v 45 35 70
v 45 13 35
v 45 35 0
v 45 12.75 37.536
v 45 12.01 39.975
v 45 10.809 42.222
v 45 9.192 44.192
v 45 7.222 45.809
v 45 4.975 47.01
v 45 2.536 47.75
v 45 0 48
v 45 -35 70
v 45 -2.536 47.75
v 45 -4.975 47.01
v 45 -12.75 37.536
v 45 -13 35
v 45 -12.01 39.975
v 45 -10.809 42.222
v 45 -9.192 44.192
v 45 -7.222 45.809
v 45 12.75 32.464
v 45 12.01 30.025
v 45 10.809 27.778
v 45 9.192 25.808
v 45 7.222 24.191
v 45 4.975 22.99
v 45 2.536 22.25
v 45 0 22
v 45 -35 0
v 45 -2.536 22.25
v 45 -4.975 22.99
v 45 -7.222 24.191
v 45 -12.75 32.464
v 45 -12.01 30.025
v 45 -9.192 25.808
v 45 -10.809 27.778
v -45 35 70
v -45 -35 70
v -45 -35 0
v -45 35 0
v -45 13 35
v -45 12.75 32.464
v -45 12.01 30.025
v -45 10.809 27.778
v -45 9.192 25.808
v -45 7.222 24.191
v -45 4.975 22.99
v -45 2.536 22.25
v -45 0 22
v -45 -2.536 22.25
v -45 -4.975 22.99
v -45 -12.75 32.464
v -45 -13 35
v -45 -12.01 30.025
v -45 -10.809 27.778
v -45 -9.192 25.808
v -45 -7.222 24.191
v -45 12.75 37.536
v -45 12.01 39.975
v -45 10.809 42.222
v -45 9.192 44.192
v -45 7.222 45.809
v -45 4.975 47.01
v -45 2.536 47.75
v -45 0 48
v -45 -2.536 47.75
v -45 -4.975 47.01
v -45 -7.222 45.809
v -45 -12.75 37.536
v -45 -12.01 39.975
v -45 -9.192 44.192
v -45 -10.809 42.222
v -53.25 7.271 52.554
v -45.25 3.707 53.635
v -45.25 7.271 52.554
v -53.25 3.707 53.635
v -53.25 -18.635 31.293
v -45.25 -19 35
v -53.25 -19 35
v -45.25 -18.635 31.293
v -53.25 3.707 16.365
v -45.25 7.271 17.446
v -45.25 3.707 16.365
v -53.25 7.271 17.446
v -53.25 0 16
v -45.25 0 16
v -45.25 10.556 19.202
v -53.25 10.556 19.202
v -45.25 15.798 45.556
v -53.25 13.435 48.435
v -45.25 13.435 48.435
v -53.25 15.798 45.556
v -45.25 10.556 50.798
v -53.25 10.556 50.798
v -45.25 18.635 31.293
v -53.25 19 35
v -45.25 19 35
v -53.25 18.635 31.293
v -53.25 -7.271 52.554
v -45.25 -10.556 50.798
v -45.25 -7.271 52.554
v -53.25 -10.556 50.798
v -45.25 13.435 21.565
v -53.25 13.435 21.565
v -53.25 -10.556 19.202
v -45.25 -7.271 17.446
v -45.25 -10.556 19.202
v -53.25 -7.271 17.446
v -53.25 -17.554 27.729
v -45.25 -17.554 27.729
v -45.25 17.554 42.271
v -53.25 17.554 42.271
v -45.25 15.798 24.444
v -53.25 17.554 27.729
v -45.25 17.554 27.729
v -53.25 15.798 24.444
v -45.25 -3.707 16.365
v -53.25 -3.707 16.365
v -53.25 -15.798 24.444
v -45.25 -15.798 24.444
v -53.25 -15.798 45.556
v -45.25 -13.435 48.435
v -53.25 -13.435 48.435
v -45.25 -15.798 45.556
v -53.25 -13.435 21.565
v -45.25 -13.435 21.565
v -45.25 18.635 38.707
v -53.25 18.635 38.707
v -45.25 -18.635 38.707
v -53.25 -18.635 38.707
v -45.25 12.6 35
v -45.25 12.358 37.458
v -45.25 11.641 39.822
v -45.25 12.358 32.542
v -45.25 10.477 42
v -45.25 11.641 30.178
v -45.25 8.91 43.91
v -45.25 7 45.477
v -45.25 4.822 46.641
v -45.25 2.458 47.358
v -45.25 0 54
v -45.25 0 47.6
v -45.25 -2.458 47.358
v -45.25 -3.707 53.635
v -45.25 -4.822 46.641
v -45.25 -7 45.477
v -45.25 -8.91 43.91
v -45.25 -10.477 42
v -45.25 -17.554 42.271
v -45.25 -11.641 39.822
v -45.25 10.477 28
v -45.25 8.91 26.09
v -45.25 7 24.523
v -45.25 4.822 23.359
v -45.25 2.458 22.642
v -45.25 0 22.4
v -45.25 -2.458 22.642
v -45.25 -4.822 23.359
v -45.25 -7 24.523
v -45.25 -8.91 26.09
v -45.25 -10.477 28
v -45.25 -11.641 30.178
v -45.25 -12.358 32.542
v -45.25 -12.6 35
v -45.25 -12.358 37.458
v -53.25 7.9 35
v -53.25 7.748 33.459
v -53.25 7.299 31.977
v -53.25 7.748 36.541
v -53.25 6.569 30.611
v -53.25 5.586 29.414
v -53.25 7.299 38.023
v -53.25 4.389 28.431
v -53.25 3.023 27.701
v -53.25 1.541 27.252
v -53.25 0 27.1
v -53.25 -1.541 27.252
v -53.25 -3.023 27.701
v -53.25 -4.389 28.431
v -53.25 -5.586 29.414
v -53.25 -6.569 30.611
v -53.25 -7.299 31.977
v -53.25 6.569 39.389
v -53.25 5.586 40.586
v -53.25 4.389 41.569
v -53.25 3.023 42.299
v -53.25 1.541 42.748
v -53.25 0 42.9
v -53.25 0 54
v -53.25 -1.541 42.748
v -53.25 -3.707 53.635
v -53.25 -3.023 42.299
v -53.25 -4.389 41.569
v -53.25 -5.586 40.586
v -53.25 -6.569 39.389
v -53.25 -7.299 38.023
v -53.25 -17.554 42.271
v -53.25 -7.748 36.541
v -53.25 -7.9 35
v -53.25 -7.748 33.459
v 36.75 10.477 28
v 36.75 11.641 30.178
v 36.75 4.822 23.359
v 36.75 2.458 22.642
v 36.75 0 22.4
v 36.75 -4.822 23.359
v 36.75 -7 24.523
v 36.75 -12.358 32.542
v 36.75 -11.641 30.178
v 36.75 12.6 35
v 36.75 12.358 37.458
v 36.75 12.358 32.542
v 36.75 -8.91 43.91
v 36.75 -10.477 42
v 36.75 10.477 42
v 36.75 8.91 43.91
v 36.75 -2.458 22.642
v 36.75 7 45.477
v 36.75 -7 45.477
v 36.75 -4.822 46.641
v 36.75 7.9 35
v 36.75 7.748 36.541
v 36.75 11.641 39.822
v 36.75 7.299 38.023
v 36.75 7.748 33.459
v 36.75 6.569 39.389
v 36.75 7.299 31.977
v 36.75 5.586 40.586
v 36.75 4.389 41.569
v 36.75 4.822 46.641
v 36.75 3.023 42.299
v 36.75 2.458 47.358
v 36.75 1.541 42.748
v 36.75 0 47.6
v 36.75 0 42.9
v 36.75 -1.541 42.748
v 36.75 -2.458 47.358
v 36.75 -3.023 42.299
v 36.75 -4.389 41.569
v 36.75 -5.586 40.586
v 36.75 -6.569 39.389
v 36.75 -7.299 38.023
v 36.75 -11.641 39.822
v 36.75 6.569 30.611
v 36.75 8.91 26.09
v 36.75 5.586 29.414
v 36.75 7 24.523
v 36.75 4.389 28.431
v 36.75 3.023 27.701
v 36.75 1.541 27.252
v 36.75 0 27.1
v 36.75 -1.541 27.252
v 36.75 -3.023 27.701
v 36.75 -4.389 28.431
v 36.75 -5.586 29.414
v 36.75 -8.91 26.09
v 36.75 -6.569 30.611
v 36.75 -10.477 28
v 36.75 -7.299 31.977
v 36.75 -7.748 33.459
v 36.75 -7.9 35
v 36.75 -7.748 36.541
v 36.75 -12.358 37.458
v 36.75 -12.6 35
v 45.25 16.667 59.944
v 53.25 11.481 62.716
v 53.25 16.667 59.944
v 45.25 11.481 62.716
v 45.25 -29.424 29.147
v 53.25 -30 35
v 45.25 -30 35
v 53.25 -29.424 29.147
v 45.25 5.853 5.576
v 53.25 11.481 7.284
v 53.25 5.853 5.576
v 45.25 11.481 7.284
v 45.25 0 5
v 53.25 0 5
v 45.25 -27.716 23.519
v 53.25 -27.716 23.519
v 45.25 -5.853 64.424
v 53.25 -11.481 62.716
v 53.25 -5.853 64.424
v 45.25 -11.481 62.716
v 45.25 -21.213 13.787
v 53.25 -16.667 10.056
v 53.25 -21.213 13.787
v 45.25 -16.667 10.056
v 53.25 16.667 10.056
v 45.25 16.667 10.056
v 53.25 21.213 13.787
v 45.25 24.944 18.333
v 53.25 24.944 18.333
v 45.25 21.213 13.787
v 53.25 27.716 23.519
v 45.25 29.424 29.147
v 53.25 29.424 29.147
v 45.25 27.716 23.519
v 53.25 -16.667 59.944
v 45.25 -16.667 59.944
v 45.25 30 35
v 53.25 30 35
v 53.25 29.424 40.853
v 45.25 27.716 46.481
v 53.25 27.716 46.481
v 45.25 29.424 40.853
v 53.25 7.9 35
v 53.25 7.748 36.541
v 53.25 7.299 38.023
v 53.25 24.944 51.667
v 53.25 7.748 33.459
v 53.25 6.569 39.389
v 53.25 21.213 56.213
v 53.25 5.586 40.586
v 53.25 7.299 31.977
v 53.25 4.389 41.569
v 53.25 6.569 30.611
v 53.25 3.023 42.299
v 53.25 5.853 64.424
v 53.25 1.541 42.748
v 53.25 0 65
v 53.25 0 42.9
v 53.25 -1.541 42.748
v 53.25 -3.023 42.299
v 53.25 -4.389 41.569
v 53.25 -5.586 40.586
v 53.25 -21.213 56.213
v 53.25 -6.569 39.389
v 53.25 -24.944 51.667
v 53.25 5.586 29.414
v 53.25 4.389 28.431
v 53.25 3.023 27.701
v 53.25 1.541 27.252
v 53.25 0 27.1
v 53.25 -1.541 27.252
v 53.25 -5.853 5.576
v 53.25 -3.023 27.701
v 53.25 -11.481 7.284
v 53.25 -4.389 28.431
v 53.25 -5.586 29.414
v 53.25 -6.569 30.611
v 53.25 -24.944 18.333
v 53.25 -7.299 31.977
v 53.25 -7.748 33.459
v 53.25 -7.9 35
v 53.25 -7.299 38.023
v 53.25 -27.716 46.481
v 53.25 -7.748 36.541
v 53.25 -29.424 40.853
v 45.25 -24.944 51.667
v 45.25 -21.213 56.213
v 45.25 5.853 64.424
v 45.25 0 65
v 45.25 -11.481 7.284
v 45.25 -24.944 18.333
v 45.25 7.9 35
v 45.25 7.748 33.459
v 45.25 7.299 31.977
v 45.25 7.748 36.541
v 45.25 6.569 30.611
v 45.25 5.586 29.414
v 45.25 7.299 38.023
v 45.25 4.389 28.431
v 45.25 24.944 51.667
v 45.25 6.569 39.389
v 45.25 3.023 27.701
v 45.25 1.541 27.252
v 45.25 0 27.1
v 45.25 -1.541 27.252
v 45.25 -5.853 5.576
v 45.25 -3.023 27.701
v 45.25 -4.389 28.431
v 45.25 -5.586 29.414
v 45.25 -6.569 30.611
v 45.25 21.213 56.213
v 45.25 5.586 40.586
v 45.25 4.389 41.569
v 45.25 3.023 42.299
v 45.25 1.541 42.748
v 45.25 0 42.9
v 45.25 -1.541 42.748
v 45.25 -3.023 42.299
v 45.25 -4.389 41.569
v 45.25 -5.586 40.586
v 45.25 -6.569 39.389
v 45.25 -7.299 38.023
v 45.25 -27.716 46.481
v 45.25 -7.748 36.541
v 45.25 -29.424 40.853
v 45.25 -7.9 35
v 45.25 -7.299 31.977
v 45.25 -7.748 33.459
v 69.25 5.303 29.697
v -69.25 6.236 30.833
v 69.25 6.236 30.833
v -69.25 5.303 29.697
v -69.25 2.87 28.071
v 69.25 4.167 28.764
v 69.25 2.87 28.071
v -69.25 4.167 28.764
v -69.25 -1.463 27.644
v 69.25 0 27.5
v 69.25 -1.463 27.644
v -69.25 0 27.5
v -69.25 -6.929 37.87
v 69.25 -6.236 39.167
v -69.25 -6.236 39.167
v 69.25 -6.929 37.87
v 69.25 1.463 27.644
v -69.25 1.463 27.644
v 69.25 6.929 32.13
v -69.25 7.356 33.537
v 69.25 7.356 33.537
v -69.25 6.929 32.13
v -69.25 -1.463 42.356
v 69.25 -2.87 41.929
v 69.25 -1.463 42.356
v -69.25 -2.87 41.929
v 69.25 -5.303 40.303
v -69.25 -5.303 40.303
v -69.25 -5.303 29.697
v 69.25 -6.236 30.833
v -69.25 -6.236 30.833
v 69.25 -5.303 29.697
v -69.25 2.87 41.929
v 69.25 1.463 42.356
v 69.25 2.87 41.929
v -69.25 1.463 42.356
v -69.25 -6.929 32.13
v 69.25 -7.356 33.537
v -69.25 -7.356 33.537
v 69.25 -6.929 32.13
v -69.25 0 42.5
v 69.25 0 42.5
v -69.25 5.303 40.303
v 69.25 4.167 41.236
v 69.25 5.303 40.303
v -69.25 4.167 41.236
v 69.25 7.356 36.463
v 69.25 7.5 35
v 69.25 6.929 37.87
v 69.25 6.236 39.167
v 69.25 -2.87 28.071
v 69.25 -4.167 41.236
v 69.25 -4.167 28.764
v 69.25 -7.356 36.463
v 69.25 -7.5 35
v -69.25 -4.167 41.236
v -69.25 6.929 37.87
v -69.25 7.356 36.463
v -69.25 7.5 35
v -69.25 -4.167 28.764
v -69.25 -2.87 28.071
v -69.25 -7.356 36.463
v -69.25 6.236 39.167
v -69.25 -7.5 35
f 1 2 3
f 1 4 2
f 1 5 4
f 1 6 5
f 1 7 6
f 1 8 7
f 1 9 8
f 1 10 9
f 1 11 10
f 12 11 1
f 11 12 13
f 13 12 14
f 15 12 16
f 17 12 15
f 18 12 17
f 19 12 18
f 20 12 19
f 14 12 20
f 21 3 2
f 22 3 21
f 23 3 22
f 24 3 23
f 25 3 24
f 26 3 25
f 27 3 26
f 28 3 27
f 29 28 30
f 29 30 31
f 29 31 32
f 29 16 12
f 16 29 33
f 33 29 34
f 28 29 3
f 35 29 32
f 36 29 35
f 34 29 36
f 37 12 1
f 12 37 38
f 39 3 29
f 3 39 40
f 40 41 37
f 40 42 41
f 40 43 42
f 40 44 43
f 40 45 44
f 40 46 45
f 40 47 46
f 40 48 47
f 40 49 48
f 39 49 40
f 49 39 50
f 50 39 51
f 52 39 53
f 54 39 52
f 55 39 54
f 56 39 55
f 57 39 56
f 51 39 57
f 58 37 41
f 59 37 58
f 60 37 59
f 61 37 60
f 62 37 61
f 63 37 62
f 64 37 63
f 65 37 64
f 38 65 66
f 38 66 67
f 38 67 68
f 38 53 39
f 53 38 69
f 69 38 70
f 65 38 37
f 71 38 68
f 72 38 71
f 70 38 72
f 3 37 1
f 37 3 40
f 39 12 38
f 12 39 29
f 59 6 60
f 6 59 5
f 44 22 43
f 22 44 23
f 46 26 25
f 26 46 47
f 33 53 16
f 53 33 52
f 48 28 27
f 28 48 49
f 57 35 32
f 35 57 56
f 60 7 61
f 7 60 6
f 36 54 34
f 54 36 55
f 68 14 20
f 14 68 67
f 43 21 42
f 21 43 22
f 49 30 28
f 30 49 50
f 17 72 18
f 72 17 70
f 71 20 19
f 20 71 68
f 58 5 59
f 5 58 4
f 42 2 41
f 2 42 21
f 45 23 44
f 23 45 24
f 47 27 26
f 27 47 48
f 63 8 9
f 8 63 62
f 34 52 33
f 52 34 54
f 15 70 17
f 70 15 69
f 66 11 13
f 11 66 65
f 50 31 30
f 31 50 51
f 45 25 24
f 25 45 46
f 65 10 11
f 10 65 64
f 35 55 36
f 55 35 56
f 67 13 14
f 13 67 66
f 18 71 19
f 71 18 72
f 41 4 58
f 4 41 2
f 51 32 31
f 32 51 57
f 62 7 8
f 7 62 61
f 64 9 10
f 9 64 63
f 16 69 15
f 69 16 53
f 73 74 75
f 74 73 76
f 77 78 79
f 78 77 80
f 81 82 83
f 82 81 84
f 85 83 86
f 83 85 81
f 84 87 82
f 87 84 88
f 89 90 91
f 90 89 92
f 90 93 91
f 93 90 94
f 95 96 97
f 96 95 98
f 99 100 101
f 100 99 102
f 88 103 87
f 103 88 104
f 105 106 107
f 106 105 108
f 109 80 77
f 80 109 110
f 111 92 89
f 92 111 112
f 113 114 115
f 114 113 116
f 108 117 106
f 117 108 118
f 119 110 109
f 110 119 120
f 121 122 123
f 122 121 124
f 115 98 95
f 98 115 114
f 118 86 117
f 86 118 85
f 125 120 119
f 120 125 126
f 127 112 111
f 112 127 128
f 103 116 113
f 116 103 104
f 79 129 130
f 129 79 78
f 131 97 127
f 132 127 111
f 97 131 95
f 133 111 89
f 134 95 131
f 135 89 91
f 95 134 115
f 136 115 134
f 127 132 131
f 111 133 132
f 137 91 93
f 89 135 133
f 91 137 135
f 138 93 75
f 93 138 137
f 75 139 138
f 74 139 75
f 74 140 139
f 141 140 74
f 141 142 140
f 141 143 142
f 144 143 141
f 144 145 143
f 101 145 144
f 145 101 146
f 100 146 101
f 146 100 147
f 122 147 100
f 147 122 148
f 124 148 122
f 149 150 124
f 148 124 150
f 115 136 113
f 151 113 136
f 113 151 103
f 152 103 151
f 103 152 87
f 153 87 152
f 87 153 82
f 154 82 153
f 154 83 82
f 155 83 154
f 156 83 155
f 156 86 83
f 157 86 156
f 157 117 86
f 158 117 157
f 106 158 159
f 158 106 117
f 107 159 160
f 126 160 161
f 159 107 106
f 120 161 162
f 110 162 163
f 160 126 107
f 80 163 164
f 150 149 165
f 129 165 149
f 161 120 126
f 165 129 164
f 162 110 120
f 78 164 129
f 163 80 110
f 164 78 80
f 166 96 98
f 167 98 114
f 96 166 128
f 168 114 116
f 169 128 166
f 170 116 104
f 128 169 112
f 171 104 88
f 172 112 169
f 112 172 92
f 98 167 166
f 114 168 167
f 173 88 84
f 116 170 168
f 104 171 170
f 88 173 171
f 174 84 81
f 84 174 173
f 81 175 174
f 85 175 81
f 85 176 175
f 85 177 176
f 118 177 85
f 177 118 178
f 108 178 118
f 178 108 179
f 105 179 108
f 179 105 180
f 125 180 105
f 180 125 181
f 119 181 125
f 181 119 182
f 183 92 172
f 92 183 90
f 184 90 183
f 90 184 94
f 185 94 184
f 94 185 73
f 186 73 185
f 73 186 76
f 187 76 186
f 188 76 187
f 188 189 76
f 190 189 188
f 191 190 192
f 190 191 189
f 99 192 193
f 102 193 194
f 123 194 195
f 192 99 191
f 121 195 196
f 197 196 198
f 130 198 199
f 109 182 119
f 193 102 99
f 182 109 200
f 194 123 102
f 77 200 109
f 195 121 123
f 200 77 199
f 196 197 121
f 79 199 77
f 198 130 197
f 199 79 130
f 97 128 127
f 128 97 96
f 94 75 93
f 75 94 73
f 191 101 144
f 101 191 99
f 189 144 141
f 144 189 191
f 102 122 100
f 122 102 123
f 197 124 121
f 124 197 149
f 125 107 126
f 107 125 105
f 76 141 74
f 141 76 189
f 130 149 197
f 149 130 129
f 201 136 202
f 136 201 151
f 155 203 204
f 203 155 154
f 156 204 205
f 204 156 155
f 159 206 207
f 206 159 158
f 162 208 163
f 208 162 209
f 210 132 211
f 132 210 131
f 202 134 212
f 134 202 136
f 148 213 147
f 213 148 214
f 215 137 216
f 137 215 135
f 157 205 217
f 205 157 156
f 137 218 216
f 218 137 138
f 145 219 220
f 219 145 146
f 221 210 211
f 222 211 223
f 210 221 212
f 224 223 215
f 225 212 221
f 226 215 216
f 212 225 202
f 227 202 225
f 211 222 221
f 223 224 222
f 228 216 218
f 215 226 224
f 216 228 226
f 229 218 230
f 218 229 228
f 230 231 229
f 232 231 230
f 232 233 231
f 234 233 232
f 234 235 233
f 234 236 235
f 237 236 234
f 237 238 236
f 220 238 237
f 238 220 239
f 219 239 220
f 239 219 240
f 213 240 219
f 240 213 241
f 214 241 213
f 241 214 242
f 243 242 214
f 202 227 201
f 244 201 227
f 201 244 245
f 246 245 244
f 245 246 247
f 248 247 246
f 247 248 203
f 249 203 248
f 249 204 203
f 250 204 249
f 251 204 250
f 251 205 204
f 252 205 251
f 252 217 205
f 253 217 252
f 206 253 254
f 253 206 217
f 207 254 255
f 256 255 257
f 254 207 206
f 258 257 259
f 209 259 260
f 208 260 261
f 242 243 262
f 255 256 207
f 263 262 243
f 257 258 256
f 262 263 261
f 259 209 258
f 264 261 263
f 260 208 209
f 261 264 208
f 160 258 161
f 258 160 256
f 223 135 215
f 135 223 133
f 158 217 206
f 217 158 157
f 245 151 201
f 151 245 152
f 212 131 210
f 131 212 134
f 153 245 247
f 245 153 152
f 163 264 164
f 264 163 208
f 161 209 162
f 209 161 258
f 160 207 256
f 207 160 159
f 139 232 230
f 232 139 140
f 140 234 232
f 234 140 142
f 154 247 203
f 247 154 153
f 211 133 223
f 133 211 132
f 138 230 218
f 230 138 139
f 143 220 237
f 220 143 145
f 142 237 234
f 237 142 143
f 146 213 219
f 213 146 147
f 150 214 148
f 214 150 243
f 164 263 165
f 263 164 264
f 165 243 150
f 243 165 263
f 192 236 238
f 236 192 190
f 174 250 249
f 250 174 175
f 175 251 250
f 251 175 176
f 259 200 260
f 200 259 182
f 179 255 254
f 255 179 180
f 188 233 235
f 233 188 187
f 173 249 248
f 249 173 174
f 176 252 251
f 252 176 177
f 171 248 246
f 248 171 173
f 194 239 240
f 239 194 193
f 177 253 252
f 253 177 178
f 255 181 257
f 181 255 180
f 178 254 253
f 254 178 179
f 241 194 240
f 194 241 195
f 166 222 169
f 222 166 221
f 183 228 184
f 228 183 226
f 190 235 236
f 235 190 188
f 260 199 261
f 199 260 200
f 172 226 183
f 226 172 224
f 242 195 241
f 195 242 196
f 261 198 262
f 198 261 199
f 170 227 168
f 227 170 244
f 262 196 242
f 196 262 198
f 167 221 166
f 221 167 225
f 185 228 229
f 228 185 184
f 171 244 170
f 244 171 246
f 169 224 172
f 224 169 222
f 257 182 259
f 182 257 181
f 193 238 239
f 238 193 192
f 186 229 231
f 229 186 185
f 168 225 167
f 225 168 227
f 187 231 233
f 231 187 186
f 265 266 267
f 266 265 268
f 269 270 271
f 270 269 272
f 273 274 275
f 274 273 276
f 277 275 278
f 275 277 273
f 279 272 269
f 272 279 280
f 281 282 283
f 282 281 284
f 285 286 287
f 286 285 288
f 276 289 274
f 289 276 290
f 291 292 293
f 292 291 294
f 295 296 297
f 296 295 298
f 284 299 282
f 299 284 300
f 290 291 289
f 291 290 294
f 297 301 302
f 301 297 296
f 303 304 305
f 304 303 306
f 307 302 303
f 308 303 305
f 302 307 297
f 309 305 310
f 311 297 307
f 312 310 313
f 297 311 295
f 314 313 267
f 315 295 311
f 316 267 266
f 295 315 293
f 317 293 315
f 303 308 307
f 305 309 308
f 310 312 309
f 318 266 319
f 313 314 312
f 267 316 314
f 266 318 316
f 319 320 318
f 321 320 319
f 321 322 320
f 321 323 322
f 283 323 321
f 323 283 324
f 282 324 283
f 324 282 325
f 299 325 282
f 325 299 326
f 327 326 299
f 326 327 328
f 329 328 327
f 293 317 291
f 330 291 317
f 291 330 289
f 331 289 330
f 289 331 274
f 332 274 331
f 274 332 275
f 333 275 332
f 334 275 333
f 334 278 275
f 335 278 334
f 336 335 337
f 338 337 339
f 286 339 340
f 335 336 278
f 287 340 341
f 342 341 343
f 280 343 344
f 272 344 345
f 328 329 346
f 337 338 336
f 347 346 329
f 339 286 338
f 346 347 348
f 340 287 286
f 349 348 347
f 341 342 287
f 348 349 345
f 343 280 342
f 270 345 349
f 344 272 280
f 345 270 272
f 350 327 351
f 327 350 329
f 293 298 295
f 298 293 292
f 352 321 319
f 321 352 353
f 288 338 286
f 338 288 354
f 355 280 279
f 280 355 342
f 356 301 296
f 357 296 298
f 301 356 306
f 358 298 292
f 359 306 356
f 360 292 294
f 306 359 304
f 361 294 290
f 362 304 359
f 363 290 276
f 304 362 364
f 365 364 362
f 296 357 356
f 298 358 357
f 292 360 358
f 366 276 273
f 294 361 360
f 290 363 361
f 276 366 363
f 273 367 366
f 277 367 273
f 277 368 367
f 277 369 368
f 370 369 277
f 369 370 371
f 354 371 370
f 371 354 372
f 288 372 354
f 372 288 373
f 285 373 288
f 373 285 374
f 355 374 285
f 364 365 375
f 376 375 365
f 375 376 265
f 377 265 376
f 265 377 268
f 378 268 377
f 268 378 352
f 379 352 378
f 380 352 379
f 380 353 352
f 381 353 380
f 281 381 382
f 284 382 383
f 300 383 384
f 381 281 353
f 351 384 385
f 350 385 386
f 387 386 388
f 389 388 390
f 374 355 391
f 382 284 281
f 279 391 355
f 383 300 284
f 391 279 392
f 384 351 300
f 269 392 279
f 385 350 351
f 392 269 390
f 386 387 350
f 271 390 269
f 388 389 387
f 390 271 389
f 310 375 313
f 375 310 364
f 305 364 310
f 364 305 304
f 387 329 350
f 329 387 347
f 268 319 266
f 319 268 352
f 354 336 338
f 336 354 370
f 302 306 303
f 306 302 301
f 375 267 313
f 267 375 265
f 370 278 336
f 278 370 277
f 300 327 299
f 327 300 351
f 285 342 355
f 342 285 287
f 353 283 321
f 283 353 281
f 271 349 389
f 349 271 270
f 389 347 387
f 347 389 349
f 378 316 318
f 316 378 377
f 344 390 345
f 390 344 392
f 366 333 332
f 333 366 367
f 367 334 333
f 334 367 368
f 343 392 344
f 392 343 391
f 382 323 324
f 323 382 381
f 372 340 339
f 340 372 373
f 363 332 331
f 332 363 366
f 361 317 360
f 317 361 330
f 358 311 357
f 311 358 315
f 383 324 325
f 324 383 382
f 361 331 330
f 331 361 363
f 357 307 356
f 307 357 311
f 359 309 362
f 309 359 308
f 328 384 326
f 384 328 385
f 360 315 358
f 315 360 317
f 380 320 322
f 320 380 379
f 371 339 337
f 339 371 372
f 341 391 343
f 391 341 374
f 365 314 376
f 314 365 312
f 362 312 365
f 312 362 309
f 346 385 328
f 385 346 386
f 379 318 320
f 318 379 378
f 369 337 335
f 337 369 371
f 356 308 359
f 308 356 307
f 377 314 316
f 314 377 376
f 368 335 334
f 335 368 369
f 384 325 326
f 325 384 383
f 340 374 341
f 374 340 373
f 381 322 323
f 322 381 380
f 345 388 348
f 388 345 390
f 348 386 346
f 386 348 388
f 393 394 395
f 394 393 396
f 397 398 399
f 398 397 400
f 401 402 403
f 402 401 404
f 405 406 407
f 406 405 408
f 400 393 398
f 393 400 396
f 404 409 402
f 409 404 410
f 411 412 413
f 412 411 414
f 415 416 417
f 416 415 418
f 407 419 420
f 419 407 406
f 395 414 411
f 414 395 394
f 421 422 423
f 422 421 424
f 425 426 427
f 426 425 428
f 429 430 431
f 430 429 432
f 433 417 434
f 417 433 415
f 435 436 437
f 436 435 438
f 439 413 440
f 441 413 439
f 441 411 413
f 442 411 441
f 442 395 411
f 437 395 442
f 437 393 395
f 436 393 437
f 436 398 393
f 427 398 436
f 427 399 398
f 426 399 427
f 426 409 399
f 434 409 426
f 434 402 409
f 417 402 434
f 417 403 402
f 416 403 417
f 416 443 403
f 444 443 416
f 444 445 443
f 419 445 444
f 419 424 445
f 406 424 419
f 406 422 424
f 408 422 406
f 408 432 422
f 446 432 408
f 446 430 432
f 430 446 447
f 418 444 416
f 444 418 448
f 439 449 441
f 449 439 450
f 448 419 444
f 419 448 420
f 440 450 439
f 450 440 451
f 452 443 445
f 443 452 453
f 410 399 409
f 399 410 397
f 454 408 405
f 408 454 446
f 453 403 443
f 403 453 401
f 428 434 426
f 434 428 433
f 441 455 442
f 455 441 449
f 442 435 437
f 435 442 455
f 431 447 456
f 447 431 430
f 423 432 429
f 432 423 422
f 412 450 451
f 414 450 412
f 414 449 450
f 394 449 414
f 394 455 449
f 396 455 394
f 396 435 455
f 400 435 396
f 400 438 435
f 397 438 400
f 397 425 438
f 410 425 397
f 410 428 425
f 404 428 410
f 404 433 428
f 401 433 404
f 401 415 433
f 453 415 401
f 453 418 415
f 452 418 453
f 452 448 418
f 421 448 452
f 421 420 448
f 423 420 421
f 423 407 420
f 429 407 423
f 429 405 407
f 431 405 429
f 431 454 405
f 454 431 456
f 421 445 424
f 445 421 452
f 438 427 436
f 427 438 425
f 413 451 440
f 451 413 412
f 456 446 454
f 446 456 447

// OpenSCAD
$fn = 32;

// ------------------------------------------------------------------------
// Bushed housing: 90 x 70 x 70 mm housing, bushing d25.2
// Every part is its own module, assembly() places them once.
// ------------------------------------------------------------------------

// --- part 1 ---
module housing() {
  difference() {
    translate([-45, -35, 0]) cube([90, 70, 70]);
    translate([0, 0, 35]) rotate([0, 90, 0]) cylinder(h = 92, d = 26, center = true);
  }
}

// --- part 2 ---
module bushing() {
  difference() {
    union() {
      cylinder(h = 8, d = 38);
      translate([0, 0, 8]) cylinder(h = 82, d = 25.2);
    }
    translate([0, 0, -1]) cylinder(h = 92, d = 15.8);
  }
}

// --- part 3 ---
module shaft() {
  translate([0, 0, -69.25]) cylinder(h = 138.5, d = 15);
}

// --- part 4 ---
module cover() {
  difference() {
    cylinder(h = 8, d = 60);
    translate([0, 0, -1]) cylinder(h = 10, d = 15.8);
  }
}

// --- assembly ---
module assembly() {
  translate([0, 0, 0]) rotate([0, 0, 0]) housing();
  translate([-53.25, 0, 35]) rotate([0, 90, 0]) bushing();
  translate([0, 0, 35]) rotate([0, 90, 0]) shaft();
  translate([45.25, 0, 35]) rotate([0, 90, 0]) cover();
}

assembly();
